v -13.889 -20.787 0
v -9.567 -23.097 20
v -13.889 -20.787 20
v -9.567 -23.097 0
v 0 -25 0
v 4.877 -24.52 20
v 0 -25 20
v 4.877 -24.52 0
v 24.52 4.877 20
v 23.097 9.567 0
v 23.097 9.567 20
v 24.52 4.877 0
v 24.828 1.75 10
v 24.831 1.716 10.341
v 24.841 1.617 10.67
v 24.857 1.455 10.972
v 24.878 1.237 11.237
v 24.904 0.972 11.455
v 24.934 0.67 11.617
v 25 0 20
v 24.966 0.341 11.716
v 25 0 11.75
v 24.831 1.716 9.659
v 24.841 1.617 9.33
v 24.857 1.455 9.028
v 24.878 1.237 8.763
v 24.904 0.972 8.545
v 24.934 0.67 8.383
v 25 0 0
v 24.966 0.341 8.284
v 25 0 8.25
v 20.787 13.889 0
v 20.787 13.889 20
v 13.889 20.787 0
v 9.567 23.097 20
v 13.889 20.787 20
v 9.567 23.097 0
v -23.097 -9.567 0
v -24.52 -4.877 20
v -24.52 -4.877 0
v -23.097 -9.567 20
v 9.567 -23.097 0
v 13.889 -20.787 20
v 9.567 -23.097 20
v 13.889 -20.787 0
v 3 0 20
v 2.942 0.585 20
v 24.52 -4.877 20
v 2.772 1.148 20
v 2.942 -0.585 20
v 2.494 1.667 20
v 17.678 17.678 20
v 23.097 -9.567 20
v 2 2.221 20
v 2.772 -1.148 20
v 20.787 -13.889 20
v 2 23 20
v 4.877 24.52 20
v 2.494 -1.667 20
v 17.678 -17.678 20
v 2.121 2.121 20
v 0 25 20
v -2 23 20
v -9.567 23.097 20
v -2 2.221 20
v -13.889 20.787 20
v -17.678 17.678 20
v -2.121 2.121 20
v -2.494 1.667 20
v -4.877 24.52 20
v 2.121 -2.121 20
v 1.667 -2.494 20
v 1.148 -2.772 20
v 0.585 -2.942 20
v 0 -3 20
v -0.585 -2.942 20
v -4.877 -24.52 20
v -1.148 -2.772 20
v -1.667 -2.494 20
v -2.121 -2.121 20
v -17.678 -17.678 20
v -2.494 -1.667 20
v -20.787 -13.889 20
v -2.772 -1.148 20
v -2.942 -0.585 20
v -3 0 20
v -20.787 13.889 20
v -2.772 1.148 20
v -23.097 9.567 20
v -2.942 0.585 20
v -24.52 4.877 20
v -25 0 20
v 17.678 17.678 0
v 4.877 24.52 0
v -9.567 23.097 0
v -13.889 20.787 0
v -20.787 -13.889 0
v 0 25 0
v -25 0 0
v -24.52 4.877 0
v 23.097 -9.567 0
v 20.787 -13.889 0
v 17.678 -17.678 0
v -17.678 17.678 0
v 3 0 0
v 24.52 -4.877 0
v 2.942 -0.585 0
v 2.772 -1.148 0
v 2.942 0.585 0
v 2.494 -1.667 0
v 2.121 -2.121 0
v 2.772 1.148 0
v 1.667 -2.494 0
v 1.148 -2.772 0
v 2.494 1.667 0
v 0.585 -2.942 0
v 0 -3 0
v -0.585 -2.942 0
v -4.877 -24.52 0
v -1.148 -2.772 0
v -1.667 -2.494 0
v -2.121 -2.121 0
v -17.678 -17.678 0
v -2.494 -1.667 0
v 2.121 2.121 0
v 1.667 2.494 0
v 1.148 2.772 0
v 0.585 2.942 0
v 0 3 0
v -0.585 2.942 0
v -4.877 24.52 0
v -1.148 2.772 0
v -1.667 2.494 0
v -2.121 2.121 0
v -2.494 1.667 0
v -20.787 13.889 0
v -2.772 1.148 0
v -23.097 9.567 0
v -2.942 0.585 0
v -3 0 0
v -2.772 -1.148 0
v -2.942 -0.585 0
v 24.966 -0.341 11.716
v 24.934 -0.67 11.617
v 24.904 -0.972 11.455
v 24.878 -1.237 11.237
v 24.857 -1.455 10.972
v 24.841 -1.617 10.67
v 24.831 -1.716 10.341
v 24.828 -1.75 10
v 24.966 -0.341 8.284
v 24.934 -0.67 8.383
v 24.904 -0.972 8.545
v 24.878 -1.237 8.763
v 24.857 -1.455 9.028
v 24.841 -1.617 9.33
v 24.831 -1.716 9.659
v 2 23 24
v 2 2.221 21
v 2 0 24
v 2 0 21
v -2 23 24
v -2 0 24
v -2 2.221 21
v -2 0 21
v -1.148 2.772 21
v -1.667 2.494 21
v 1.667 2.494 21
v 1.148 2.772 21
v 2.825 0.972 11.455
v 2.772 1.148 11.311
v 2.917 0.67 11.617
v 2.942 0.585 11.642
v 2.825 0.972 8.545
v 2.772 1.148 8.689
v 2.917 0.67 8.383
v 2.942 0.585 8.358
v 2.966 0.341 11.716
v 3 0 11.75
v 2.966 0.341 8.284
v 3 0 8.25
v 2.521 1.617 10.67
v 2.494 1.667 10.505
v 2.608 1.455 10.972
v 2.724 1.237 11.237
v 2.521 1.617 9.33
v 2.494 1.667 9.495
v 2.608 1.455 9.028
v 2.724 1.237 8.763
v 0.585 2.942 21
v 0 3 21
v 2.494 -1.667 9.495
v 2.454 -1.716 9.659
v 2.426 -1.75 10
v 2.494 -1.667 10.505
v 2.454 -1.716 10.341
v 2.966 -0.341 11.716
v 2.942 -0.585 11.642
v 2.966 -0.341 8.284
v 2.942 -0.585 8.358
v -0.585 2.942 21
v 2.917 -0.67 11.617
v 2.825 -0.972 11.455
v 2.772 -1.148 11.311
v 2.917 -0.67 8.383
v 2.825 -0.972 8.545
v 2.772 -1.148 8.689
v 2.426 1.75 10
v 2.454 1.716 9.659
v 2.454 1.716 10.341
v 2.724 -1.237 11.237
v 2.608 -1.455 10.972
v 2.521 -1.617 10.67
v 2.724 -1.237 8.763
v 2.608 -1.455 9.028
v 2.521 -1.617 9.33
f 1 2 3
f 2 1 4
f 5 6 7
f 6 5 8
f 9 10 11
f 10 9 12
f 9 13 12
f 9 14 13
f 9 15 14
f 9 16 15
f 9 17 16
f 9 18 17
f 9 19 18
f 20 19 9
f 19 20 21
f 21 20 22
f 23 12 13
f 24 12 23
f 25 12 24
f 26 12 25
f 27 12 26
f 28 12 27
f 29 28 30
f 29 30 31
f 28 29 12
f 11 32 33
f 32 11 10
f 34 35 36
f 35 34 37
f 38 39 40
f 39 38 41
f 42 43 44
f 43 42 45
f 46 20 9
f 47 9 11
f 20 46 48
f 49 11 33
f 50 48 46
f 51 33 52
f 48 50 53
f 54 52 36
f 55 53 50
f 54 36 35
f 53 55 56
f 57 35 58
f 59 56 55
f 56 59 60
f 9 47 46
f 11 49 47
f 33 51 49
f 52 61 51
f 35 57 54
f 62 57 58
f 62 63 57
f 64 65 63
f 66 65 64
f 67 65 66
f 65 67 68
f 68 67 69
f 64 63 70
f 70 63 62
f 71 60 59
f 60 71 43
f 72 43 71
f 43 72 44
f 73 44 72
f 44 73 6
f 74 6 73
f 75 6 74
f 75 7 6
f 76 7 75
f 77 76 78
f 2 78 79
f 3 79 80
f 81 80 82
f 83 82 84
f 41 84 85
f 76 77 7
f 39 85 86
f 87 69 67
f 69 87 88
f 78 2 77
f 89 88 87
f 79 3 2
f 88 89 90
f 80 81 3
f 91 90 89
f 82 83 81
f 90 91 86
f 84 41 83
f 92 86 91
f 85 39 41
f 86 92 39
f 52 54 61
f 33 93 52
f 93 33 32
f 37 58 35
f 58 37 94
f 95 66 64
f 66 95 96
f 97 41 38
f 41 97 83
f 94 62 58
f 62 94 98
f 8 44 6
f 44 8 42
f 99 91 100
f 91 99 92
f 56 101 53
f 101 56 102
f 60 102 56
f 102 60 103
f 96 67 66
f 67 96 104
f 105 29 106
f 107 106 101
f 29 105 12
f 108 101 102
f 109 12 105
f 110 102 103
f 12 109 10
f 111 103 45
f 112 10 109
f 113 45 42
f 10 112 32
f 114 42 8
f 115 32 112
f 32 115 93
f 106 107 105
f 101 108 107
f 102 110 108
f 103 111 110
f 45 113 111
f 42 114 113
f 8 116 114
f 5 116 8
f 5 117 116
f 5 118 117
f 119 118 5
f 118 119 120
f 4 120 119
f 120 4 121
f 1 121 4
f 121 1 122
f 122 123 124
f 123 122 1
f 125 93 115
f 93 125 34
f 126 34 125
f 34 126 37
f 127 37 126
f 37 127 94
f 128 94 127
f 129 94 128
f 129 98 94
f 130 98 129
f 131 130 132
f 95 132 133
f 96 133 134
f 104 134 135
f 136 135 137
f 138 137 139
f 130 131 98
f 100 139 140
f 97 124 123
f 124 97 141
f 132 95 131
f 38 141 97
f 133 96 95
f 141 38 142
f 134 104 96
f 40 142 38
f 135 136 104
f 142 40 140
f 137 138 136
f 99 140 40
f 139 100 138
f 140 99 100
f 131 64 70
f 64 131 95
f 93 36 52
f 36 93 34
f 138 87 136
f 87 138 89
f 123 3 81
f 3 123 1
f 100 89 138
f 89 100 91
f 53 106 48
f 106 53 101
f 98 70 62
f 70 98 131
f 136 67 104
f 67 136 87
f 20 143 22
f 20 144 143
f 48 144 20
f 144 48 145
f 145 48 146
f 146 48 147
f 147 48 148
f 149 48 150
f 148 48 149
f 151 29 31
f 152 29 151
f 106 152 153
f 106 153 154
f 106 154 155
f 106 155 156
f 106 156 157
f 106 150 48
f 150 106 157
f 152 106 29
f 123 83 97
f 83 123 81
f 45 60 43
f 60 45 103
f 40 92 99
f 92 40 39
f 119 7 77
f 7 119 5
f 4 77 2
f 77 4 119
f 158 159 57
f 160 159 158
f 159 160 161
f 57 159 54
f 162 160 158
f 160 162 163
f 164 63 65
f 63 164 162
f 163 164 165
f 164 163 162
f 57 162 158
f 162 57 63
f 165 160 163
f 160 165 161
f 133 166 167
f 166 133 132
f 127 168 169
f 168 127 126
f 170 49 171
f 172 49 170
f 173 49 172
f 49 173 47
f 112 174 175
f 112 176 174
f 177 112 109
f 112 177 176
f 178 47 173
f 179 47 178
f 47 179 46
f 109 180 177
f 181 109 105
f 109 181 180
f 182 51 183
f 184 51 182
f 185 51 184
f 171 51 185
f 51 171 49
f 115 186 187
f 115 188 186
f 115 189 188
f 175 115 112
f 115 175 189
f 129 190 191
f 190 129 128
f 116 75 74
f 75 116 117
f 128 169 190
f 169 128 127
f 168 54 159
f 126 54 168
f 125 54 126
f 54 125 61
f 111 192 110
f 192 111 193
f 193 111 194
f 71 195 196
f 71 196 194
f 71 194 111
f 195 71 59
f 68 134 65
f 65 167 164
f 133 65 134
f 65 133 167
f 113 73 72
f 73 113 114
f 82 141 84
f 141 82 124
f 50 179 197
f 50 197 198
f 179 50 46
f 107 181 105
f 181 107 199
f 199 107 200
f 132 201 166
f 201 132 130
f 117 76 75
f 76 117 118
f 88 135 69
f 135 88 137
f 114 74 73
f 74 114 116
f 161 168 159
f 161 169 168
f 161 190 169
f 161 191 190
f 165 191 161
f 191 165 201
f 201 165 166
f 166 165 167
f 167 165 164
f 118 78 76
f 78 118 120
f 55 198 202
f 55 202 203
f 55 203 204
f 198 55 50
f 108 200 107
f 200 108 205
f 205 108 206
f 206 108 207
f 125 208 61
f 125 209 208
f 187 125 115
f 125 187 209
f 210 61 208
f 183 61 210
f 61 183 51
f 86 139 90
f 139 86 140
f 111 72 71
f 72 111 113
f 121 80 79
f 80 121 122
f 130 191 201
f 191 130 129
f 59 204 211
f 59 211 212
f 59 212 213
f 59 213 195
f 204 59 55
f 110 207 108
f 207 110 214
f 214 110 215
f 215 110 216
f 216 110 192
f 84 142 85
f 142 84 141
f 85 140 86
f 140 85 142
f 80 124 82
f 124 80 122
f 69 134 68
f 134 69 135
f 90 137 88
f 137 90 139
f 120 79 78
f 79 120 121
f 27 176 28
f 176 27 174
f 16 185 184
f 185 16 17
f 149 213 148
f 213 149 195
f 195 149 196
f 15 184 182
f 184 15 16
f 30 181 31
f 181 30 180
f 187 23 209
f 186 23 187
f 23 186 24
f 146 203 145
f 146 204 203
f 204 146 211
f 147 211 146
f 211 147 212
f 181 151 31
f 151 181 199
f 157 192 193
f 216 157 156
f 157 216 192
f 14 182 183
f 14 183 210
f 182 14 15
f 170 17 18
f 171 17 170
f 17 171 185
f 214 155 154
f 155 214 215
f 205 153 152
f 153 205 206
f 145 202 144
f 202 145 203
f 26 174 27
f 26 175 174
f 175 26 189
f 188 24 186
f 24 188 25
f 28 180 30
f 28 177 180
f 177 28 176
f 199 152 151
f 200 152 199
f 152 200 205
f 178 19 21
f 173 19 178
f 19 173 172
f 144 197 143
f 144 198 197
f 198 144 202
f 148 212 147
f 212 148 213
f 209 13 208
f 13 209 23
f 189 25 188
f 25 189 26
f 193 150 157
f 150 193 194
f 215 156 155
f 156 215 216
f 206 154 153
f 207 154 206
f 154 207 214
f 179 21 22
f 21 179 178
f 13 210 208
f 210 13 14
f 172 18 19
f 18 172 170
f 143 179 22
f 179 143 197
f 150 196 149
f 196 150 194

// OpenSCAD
$fn = 32;

// ----------------------------------------------------------------------
// Control knob: pointer knob
// ----------------------------------------------------------------------

// --- parameters (mm) ---
rib_w = 4;                // pointer rib width
rib_h = 5;                // pointer rib height
knob_d = 50;              // knob body diameter
knob_h = 20;              // knob body height
bore_d = 6;               // shaft bore diameter
set_d = 3.5;              // set screw bore diameter

rib_poke = rib_h - 1;  // rib height above the top
total_h = knob_h + rib_h - 1;  // overall height

difference() {
  union() {
    cylinder(h = knob_h, d = knob_d);
    translate([-rib_w / 2, 0, knob_h - 1])
      cube([rib_w, knob_d / 2 - 2, rib_h]);
  }
  translate([0, 0, -1]) cylinder(h = knob_h + 2, d = bore_d);
  translate([-1, 0, knob_h / 2]) rotate([0, 90, 0])
    cylinder(h = knob_d / 2 + bore_d / 2 + 2, d = set_d);}
